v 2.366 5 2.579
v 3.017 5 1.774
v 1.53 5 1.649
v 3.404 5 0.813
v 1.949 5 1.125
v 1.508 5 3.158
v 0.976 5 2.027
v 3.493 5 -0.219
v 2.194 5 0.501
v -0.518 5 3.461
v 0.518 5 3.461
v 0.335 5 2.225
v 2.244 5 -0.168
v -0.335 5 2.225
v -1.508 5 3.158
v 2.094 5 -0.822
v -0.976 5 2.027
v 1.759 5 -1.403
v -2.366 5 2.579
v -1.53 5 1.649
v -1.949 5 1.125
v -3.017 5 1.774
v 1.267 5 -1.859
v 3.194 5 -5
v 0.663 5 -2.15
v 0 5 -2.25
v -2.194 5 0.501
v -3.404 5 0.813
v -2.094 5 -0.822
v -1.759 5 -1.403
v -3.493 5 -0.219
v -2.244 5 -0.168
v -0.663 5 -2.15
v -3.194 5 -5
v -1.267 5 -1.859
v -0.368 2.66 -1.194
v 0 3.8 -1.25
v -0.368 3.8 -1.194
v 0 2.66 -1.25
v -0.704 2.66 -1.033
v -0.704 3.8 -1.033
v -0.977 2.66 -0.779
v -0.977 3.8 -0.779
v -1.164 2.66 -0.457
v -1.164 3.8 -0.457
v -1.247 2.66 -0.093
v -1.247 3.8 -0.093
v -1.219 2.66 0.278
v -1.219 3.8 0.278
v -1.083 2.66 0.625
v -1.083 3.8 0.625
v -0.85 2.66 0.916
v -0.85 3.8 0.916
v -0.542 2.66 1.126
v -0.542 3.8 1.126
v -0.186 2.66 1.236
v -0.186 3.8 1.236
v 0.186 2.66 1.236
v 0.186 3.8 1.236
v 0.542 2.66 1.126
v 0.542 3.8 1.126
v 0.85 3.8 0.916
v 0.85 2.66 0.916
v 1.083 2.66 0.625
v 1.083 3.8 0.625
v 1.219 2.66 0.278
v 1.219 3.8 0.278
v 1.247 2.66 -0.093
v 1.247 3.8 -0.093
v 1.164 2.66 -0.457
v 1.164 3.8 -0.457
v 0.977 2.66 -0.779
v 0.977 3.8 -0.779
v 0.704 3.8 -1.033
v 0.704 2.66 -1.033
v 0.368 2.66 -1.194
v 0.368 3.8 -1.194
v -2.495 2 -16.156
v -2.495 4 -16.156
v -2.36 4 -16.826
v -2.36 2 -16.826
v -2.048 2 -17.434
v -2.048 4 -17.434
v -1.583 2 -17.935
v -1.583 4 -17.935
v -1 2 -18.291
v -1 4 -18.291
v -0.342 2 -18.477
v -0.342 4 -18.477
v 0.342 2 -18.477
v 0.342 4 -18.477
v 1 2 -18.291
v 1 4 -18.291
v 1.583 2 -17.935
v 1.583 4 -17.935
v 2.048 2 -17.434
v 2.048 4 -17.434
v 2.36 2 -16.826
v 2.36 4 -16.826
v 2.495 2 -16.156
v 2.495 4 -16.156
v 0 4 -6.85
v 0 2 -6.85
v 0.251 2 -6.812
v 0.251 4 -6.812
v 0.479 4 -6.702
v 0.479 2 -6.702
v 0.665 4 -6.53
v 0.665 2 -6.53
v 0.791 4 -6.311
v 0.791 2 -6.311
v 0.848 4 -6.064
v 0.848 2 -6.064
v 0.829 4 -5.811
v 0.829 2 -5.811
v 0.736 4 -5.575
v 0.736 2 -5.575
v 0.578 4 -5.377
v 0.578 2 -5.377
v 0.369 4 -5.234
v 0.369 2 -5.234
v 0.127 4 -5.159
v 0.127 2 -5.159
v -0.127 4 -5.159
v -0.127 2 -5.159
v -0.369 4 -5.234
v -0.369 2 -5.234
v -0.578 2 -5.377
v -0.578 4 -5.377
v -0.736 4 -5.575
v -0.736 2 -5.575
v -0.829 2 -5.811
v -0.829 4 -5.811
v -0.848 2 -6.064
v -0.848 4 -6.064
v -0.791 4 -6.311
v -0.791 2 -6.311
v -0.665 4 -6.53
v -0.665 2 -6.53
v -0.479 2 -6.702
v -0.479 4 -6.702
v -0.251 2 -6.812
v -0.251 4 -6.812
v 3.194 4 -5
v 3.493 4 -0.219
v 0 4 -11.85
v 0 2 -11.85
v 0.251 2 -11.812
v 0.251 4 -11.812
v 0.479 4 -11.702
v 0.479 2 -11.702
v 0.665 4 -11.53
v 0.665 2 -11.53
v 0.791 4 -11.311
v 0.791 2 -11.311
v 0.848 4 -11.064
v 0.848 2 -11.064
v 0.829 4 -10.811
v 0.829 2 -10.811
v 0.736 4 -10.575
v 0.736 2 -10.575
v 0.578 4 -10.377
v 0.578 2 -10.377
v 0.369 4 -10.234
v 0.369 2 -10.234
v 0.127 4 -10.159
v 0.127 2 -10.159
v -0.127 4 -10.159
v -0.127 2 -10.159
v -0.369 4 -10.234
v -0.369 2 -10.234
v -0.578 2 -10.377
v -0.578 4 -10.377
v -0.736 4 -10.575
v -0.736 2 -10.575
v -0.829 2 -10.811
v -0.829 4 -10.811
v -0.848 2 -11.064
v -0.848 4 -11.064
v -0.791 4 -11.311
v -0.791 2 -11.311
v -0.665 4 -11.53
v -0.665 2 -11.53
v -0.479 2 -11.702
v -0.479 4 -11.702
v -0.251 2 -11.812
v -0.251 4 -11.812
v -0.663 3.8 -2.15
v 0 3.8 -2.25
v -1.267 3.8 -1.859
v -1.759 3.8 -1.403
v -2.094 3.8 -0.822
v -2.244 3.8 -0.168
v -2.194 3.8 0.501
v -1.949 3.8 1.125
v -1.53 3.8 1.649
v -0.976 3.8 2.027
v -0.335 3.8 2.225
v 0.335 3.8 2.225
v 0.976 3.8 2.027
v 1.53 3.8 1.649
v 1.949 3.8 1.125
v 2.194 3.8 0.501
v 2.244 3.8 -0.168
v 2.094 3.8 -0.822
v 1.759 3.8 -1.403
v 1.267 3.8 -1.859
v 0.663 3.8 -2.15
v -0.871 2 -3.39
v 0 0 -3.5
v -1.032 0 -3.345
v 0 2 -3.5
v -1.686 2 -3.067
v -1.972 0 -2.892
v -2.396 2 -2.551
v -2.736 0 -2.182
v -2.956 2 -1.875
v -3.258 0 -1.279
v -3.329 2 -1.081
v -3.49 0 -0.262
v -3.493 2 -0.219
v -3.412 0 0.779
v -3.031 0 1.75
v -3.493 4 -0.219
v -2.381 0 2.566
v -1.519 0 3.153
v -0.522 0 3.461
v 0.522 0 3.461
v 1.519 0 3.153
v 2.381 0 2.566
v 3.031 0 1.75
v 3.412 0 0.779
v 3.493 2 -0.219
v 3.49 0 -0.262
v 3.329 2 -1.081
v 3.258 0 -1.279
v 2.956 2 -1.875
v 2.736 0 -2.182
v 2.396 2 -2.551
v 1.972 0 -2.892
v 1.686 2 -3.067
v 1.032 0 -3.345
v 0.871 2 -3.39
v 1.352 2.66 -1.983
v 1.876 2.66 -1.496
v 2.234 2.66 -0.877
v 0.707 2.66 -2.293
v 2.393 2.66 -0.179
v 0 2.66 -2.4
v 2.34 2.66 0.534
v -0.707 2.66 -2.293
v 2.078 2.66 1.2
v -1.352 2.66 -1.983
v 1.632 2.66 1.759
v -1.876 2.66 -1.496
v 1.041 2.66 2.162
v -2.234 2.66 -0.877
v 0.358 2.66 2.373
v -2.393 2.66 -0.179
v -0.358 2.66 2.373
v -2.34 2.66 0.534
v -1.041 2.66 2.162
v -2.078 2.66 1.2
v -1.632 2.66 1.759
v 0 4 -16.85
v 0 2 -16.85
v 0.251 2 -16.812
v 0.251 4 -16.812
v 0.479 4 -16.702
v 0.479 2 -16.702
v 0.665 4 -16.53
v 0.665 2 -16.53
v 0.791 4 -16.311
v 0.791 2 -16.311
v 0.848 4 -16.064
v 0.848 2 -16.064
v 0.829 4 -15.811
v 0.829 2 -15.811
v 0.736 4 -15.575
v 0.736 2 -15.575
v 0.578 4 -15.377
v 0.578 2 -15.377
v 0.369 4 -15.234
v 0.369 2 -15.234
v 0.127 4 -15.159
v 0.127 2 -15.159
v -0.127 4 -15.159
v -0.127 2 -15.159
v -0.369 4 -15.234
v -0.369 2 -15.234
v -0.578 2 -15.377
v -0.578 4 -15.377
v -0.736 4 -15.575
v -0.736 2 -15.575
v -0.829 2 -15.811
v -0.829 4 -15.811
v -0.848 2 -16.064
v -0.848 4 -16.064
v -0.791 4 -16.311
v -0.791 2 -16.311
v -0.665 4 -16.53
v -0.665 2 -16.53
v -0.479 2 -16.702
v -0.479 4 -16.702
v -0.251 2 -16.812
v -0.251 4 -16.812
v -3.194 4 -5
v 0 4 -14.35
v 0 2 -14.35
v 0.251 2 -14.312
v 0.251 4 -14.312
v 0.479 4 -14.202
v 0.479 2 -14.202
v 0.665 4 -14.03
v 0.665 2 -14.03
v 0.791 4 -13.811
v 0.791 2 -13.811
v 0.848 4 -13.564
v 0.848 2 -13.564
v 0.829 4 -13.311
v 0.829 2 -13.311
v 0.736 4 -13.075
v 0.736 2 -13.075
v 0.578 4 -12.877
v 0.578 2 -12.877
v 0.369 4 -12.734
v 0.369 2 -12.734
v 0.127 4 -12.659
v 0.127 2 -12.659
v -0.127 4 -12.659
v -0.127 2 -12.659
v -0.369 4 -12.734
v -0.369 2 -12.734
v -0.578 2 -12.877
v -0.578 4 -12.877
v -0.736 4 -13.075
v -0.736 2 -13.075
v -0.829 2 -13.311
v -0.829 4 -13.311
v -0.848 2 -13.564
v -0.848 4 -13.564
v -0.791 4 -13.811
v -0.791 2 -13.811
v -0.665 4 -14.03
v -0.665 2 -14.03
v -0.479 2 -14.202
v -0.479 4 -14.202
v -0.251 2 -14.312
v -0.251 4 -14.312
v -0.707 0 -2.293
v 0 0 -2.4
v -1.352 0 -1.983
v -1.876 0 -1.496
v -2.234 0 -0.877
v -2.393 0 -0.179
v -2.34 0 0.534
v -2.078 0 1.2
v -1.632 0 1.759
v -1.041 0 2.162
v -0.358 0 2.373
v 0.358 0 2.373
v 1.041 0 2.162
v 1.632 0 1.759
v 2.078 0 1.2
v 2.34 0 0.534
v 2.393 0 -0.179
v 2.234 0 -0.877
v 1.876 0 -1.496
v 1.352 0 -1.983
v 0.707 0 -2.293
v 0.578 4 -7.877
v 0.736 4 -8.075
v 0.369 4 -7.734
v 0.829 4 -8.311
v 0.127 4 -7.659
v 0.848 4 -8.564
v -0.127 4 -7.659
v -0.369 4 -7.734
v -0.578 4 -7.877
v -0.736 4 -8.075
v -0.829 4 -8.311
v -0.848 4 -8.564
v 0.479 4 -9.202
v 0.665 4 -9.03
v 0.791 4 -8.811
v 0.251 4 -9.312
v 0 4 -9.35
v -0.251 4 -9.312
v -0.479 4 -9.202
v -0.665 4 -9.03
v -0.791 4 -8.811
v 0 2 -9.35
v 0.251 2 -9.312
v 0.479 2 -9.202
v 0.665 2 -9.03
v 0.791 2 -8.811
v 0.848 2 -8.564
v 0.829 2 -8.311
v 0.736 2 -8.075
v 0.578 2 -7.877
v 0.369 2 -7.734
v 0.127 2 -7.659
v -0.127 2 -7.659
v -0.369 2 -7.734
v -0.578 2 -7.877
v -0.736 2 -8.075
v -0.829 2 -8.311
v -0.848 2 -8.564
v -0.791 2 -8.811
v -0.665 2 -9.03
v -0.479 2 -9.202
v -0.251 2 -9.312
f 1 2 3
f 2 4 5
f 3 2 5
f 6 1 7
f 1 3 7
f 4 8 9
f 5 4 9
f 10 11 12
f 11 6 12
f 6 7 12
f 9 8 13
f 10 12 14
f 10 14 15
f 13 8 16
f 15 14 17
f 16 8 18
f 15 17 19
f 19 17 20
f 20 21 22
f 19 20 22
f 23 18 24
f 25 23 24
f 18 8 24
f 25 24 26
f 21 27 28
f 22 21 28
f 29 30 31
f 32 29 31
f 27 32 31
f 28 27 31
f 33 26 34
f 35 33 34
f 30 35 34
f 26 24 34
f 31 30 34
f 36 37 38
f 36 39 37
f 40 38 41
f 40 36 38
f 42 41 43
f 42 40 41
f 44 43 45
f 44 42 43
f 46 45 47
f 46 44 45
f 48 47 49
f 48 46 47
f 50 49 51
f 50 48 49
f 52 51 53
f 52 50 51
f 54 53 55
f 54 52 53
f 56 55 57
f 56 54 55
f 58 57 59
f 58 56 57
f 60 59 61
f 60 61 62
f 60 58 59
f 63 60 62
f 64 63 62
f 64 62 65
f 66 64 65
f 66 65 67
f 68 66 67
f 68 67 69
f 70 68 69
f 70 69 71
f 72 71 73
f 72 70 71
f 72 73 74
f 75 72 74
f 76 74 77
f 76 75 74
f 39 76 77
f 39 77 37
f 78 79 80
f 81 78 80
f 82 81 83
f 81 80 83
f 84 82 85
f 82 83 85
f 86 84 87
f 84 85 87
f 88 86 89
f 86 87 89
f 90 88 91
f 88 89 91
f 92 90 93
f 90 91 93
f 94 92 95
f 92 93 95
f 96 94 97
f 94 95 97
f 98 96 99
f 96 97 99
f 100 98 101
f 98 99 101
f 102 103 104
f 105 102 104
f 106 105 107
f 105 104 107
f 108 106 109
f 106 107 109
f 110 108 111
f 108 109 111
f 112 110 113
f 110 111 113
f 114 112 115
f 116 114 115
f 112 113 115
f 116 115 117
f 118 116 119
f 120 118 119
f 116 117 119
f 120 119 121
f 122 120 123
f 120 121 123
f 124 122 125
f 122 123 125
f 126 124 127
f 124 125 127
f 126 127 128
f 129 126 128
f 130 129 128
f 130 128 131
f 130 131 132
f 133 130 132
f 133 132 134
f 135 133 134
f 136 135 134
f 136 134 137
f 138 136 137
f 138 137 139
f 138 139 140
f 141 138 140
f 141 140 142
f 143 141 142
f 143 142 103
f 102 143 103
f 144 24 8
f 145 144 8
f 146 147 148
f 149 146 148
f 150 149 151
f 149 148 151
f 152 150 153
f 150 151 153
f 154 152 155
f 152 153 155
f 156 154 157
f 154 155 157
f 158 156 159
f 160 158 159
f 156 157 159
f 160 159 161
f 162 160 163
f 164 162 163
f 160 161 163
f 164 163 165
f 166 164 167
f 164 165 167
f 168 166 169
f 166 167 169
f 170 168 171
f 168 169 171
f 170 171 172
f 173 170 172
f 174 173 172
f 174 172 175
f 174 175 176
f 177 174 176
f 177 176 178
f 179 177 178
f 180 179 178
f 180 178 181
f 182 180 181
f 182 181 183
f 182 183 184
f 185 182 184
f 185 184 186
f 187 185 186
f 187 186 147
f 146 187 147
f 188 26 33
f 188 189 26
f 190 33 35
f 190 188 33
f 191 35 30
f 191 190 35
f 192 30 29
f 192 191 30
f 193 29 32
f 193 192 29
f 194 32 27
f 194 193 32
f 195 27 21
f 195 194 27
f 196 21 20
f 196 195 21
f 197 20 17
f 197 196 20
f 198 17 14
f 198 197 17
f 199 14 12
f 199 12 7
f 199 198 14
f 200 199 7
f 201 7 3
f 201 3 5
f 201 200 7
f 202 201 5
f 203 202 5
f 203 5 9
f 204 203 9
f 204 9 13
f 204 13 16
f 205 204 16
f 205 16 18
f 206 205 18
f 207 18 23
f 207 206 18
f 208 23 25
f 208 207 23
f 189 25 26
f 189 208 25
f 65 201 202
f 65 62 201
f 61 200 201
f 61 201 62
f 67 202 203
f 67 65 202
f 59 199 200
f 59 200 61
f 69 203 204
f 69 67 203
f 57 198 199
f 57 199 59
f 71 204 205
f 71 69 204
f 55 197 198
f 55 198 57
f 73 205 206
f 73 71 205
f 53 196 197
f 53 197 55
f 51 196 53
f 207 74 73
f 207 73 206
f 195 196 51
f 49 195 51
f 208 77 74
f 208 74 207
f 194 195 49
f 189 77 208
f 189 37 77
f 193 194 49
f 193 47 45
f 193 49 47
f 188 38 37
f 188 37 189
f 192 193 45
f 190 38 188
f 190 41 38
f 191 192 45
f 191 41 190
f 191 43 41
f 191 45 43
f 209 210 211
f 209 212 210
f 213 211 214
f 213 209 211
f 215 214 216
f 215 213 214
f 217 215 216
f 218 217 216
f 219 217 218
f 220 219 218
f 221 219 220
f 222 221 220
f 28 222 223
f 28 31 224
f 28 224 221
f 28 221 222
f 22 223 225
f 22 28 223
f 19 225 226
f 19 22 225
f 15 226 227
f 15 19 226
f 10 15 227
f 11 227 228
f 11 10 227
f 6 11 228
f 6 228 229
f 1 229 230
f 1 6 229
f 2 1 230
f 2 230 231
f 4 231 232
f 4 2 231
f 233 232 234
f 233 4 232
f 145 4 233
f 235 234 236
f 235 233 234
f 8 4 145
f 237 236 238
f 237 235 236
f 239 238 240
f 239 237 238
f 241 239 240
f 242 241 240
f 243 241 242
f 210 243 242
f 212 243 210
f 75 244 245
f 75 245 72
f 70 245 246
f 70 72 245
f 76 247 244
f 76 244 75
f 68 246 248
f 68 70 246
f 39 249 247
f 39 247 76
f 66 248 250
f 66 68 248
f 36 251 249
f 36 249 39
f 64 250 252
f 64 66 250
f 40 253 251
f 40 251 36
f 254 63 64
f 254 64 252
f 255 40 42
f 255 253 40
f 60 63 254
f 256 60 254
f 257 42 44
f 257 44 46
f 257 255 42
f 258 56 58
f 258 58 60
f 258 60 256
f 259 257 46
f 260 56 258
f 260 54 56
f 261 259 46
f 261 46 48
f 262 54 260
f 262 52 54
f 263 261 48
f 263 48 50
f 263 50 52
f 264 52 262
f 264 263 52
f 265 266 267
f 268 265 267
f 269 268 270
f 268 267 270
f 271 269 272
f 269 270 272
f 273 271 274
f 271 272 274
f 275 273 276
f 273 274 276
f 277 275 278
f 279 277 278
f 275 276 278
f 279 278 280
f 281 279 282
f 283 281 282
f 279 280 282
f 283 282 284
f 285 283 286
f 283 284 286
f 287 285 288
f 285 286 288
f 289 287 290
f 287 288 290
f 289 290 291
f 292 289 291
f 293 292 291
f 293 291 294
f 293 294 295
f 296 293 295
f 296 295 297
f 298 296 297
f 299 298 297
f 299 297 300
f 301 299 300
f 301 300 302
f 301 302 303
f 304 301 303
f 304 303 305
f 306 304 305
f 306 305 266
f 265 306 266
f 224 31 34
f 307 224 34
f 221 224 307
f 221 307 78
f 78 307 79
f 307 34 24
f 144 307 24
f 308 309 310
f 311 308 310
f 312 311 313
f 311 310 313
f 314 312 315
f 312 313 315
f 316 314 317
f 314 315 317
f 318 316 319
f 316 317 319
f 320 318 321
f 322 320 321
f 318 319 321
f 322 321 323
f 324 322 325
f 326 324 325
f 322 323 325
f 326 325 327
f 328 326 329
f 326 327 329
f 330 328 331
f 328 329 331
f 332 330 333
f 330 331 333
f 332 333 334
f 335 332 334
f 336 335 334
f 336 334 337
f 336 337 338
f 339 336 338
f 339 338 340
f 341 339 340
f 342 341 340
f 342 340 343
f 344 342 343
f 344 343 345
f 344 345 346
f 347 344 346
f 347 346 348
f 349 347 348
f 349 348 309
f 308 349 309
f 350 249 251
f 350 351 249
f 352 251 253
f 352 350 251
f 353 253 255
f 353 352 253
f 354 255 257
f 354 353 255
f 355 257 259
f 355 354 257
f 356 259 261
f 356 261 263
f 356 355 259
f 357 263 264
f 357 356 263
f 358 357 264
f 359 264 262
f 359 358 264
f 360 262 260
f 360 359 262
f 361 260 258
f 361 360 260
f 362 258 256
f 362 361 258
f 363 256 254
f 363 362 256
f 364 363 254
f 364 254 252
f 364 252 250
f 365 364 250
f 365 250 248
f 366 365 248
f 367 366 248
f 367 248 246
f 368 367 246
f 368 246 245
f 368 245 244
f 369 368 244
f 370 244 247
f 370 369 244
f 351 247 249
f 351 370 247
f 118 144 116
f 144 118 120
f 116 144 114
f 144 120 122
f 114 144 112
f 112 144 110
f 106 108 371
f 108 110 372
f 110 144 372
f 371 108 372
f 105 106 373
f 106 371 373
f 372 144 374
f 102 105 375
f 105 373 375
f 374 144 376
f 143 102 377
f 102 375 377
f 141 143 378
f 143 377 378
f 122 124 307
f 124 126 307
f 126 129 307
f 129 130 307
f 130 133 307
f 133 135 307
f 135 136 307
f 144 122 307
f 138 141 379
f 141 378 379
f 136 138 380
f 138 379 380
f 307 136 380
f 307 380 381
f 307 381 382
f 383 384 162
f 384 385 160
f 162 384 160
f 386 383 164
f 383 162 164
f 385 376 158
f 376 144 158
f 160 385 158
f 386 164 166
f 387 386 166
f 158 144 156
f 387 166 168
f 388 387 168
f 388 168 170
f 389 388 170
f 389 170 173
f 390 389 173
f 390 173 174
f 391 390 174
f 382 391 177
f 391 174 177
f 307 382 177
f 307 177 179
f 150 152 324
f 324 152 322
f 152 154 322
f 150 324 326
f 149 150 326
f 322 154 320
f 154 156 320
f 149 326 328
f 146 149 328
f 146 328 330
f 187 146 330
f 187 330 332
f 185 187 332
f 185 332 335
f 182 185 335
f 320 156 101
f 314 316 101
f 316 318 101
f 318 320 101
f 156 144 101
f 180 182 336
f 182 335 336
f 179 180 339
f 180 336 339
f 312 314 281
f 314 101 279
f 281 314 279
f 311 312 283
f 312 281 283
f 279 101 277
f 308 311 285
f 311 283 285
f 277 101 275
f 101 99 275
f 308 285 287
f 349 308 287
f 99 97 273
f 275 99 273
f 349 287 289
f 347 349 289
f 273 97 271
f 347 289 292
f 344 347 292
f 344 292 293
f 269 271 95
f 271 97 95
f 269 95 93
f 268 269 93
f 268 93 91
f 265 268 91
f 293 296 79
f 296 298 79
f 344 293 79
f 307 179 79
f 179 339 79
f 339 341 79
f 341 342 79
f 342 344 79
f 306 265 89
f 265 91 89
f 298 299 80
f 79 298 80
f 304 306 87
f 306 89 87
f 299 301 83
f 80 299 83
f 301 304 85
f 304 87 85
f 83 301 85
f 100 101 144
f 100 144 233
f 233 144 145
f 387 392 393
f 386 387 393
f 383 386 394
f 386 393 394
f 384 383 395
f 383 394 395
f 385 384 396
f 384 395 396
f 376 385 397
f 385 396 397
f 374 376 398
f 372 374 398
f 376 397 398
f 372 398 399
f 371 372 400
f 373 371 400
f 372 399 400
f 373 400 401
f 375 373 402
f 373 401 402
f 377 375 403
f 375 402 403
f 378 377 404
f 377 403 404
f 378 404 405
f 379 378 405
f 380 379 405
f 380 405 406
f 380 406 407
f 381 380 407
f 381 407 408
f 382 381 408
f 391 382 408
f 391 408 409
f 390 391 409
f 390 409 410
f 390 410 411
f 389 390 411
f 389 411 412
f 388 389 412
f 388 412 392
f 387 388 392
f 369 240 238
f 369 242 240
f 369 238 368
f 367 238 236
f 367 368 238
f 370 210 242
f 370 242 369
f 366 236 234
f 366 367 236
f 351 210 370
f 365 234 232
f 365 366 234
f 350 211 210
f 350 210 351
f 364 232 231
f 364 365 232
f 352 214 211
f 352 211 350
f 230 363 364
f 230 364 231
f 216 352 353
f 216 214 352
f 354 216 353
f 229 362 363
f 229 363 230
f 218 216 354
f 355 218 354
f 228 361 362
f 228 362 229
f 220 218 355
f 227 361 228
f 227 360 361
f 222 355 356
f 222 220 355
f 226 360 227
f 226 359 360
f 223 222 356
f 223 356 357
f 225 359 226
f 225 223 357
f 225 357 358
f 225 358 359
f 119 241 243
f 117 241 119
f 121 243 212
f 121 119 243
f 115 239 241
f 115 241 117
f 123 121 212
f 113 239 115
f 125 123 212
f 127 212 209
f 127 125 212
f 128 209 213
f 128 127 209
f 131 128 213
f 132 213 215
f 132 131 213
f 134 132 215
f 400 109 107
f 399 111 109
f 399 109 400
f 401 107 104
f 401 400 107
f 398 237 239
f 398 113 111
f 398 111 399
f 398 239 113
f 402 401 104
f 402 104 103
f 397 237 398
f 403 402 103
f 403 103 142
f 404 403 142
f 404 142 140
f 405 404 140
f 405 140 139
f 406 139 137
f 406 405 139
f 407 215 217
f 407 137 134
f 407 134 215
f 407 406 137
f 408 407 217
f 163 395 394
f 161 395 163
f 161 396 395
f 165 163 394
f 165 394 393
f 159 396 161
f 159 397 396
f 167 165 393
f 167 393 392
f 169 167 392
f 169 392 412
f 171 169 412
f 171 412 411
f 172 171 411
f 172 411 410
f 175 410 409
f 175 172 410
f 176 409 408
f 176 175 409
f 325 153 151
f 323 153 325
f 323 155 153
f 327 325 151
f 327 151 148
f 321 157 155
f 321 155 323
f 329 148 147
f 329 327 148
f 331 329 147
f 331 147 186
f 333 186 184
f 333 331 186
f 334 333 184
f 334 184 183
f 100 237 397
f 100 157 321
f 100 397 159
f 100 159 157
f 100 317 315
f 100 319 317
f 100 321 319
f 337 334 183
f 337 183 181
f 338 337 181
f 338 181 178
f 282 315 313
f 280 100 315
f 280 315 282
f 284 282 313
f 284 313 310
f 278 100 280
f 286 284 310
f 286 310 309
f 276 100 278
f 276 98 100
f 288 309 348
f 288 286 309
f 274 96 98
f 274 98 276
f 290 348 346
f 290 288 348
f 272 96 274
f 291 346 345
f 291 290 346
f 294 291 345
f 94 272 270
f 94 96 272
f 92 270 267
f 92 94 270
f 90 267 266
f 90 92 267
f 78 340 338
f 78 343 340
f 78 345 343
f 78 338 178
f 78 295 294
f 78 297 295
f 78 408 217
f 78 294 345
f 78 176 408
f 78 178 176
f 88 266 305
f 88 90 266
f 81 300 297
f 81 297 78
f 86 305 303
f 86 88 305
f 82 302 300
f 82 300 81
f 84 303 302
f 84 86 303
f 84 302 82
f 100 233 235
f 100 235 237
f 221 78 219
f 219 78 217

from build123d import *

# Parameters (mm, degrees)
EXTRUDE_START       = -2
EXTRUDE_1_DEPTH     = 2
EXTRUDE_2_DEPTH     = 1
SKETCH_4_R          = 0.85
CUT_EXTRUDE_1_DEPTH = 10


with BuildPart() as part:
    # 草图1 → 旋转1 (revolve)
    with BuildSketch(Plane.XY, mode=Mode.PRIVATE) as revolve_1_sk:
        Polygon((-2.4, 0), (-3.5, 0), (-3.5, 5), (-2.25, 5), (-2.25, 3.8), (-1.25, 3.8), (-1.25, 2.66), (-2.4, 2.66), align=None)
    revolve(revolve_1_sk.sketch.rotate(Axis((0, 0, 0), (0, 1, 0)), 270), axis=Axis((0, 0, 0), (0, 1, 0)))

    # 草图2 → 凸台-拉伸1 (add)
    with BuildSketch(Plane(origin=(0, 2, 0), x_dir=(-1, 0, 0), z_dir=(0, -1, 0)).offset(EXTRUDE_START)):
        with BuildLine():
            Line((-2.49511241, 16.15625), (-3.493157374, 0.21875))
            ThreePointArc((-3.493157374, 0.21875), (0, 3.5), (3.493157374, 0.21875))
            Line((3.493157374, 0.21875), (2.49511241, 16.15625))
            ThreePointArc((2.49511241, 16.15625), (0, 18.5), (-2.49511241, 16.15625))
        make_face()
    extrude(amount=EXTRUDE_1_DEPTH)

    # 草图3 → 凸台-拉伸2 (add)
    with BuildSketch(Plane(origin=(0, 5, 0), x_dir=(1, 0, 0), z_dir=(0, 1, 0))):
        with BuildLine():
            Line((-3.193743885, 5), (3.193743885, 5))
            Line((3.193743885, 5), (3.493157374, 0.21875))
            ThreePointArc((3.493157374, 0.21875), (0, 3.5), (-3.493157374, 0.21875))
            Line((-3.493157374, 0.21875), (-3.193743885, 5))
        make_face()
    extrude(amount=-EXTRUDE_2_DEPTH)

    # 草图4 → 切除-拉伸1 (cut)
    with BuildSketch(Plane.XZ.offset(-2)):
        with Locations(Location((0, -6, 0), (0, 0, 270))):
            Circle(SKETCH_4_R)
        with Locations(Location((0, -16, 0), (0, 0, 270))):
            Circle(SKETCH_4_R)
        with Locations(Location((0, -13.5, 0), (0, 0, 270))):
            Circle(SKETCH_4_R)
        with Locations(Location((0, -8.5, 0), (0, 0, 270))):
            Circle(SKETCH_4_R)
        with Locations(Location((0, -11, 0), (0, 0, 270))):
            Circle(SKETCH_4_R)
    extrude(amount=-CUT_EXTRUDE_1_DEPTH, mode=Mode.SUBTRACT)


solid = part.part
